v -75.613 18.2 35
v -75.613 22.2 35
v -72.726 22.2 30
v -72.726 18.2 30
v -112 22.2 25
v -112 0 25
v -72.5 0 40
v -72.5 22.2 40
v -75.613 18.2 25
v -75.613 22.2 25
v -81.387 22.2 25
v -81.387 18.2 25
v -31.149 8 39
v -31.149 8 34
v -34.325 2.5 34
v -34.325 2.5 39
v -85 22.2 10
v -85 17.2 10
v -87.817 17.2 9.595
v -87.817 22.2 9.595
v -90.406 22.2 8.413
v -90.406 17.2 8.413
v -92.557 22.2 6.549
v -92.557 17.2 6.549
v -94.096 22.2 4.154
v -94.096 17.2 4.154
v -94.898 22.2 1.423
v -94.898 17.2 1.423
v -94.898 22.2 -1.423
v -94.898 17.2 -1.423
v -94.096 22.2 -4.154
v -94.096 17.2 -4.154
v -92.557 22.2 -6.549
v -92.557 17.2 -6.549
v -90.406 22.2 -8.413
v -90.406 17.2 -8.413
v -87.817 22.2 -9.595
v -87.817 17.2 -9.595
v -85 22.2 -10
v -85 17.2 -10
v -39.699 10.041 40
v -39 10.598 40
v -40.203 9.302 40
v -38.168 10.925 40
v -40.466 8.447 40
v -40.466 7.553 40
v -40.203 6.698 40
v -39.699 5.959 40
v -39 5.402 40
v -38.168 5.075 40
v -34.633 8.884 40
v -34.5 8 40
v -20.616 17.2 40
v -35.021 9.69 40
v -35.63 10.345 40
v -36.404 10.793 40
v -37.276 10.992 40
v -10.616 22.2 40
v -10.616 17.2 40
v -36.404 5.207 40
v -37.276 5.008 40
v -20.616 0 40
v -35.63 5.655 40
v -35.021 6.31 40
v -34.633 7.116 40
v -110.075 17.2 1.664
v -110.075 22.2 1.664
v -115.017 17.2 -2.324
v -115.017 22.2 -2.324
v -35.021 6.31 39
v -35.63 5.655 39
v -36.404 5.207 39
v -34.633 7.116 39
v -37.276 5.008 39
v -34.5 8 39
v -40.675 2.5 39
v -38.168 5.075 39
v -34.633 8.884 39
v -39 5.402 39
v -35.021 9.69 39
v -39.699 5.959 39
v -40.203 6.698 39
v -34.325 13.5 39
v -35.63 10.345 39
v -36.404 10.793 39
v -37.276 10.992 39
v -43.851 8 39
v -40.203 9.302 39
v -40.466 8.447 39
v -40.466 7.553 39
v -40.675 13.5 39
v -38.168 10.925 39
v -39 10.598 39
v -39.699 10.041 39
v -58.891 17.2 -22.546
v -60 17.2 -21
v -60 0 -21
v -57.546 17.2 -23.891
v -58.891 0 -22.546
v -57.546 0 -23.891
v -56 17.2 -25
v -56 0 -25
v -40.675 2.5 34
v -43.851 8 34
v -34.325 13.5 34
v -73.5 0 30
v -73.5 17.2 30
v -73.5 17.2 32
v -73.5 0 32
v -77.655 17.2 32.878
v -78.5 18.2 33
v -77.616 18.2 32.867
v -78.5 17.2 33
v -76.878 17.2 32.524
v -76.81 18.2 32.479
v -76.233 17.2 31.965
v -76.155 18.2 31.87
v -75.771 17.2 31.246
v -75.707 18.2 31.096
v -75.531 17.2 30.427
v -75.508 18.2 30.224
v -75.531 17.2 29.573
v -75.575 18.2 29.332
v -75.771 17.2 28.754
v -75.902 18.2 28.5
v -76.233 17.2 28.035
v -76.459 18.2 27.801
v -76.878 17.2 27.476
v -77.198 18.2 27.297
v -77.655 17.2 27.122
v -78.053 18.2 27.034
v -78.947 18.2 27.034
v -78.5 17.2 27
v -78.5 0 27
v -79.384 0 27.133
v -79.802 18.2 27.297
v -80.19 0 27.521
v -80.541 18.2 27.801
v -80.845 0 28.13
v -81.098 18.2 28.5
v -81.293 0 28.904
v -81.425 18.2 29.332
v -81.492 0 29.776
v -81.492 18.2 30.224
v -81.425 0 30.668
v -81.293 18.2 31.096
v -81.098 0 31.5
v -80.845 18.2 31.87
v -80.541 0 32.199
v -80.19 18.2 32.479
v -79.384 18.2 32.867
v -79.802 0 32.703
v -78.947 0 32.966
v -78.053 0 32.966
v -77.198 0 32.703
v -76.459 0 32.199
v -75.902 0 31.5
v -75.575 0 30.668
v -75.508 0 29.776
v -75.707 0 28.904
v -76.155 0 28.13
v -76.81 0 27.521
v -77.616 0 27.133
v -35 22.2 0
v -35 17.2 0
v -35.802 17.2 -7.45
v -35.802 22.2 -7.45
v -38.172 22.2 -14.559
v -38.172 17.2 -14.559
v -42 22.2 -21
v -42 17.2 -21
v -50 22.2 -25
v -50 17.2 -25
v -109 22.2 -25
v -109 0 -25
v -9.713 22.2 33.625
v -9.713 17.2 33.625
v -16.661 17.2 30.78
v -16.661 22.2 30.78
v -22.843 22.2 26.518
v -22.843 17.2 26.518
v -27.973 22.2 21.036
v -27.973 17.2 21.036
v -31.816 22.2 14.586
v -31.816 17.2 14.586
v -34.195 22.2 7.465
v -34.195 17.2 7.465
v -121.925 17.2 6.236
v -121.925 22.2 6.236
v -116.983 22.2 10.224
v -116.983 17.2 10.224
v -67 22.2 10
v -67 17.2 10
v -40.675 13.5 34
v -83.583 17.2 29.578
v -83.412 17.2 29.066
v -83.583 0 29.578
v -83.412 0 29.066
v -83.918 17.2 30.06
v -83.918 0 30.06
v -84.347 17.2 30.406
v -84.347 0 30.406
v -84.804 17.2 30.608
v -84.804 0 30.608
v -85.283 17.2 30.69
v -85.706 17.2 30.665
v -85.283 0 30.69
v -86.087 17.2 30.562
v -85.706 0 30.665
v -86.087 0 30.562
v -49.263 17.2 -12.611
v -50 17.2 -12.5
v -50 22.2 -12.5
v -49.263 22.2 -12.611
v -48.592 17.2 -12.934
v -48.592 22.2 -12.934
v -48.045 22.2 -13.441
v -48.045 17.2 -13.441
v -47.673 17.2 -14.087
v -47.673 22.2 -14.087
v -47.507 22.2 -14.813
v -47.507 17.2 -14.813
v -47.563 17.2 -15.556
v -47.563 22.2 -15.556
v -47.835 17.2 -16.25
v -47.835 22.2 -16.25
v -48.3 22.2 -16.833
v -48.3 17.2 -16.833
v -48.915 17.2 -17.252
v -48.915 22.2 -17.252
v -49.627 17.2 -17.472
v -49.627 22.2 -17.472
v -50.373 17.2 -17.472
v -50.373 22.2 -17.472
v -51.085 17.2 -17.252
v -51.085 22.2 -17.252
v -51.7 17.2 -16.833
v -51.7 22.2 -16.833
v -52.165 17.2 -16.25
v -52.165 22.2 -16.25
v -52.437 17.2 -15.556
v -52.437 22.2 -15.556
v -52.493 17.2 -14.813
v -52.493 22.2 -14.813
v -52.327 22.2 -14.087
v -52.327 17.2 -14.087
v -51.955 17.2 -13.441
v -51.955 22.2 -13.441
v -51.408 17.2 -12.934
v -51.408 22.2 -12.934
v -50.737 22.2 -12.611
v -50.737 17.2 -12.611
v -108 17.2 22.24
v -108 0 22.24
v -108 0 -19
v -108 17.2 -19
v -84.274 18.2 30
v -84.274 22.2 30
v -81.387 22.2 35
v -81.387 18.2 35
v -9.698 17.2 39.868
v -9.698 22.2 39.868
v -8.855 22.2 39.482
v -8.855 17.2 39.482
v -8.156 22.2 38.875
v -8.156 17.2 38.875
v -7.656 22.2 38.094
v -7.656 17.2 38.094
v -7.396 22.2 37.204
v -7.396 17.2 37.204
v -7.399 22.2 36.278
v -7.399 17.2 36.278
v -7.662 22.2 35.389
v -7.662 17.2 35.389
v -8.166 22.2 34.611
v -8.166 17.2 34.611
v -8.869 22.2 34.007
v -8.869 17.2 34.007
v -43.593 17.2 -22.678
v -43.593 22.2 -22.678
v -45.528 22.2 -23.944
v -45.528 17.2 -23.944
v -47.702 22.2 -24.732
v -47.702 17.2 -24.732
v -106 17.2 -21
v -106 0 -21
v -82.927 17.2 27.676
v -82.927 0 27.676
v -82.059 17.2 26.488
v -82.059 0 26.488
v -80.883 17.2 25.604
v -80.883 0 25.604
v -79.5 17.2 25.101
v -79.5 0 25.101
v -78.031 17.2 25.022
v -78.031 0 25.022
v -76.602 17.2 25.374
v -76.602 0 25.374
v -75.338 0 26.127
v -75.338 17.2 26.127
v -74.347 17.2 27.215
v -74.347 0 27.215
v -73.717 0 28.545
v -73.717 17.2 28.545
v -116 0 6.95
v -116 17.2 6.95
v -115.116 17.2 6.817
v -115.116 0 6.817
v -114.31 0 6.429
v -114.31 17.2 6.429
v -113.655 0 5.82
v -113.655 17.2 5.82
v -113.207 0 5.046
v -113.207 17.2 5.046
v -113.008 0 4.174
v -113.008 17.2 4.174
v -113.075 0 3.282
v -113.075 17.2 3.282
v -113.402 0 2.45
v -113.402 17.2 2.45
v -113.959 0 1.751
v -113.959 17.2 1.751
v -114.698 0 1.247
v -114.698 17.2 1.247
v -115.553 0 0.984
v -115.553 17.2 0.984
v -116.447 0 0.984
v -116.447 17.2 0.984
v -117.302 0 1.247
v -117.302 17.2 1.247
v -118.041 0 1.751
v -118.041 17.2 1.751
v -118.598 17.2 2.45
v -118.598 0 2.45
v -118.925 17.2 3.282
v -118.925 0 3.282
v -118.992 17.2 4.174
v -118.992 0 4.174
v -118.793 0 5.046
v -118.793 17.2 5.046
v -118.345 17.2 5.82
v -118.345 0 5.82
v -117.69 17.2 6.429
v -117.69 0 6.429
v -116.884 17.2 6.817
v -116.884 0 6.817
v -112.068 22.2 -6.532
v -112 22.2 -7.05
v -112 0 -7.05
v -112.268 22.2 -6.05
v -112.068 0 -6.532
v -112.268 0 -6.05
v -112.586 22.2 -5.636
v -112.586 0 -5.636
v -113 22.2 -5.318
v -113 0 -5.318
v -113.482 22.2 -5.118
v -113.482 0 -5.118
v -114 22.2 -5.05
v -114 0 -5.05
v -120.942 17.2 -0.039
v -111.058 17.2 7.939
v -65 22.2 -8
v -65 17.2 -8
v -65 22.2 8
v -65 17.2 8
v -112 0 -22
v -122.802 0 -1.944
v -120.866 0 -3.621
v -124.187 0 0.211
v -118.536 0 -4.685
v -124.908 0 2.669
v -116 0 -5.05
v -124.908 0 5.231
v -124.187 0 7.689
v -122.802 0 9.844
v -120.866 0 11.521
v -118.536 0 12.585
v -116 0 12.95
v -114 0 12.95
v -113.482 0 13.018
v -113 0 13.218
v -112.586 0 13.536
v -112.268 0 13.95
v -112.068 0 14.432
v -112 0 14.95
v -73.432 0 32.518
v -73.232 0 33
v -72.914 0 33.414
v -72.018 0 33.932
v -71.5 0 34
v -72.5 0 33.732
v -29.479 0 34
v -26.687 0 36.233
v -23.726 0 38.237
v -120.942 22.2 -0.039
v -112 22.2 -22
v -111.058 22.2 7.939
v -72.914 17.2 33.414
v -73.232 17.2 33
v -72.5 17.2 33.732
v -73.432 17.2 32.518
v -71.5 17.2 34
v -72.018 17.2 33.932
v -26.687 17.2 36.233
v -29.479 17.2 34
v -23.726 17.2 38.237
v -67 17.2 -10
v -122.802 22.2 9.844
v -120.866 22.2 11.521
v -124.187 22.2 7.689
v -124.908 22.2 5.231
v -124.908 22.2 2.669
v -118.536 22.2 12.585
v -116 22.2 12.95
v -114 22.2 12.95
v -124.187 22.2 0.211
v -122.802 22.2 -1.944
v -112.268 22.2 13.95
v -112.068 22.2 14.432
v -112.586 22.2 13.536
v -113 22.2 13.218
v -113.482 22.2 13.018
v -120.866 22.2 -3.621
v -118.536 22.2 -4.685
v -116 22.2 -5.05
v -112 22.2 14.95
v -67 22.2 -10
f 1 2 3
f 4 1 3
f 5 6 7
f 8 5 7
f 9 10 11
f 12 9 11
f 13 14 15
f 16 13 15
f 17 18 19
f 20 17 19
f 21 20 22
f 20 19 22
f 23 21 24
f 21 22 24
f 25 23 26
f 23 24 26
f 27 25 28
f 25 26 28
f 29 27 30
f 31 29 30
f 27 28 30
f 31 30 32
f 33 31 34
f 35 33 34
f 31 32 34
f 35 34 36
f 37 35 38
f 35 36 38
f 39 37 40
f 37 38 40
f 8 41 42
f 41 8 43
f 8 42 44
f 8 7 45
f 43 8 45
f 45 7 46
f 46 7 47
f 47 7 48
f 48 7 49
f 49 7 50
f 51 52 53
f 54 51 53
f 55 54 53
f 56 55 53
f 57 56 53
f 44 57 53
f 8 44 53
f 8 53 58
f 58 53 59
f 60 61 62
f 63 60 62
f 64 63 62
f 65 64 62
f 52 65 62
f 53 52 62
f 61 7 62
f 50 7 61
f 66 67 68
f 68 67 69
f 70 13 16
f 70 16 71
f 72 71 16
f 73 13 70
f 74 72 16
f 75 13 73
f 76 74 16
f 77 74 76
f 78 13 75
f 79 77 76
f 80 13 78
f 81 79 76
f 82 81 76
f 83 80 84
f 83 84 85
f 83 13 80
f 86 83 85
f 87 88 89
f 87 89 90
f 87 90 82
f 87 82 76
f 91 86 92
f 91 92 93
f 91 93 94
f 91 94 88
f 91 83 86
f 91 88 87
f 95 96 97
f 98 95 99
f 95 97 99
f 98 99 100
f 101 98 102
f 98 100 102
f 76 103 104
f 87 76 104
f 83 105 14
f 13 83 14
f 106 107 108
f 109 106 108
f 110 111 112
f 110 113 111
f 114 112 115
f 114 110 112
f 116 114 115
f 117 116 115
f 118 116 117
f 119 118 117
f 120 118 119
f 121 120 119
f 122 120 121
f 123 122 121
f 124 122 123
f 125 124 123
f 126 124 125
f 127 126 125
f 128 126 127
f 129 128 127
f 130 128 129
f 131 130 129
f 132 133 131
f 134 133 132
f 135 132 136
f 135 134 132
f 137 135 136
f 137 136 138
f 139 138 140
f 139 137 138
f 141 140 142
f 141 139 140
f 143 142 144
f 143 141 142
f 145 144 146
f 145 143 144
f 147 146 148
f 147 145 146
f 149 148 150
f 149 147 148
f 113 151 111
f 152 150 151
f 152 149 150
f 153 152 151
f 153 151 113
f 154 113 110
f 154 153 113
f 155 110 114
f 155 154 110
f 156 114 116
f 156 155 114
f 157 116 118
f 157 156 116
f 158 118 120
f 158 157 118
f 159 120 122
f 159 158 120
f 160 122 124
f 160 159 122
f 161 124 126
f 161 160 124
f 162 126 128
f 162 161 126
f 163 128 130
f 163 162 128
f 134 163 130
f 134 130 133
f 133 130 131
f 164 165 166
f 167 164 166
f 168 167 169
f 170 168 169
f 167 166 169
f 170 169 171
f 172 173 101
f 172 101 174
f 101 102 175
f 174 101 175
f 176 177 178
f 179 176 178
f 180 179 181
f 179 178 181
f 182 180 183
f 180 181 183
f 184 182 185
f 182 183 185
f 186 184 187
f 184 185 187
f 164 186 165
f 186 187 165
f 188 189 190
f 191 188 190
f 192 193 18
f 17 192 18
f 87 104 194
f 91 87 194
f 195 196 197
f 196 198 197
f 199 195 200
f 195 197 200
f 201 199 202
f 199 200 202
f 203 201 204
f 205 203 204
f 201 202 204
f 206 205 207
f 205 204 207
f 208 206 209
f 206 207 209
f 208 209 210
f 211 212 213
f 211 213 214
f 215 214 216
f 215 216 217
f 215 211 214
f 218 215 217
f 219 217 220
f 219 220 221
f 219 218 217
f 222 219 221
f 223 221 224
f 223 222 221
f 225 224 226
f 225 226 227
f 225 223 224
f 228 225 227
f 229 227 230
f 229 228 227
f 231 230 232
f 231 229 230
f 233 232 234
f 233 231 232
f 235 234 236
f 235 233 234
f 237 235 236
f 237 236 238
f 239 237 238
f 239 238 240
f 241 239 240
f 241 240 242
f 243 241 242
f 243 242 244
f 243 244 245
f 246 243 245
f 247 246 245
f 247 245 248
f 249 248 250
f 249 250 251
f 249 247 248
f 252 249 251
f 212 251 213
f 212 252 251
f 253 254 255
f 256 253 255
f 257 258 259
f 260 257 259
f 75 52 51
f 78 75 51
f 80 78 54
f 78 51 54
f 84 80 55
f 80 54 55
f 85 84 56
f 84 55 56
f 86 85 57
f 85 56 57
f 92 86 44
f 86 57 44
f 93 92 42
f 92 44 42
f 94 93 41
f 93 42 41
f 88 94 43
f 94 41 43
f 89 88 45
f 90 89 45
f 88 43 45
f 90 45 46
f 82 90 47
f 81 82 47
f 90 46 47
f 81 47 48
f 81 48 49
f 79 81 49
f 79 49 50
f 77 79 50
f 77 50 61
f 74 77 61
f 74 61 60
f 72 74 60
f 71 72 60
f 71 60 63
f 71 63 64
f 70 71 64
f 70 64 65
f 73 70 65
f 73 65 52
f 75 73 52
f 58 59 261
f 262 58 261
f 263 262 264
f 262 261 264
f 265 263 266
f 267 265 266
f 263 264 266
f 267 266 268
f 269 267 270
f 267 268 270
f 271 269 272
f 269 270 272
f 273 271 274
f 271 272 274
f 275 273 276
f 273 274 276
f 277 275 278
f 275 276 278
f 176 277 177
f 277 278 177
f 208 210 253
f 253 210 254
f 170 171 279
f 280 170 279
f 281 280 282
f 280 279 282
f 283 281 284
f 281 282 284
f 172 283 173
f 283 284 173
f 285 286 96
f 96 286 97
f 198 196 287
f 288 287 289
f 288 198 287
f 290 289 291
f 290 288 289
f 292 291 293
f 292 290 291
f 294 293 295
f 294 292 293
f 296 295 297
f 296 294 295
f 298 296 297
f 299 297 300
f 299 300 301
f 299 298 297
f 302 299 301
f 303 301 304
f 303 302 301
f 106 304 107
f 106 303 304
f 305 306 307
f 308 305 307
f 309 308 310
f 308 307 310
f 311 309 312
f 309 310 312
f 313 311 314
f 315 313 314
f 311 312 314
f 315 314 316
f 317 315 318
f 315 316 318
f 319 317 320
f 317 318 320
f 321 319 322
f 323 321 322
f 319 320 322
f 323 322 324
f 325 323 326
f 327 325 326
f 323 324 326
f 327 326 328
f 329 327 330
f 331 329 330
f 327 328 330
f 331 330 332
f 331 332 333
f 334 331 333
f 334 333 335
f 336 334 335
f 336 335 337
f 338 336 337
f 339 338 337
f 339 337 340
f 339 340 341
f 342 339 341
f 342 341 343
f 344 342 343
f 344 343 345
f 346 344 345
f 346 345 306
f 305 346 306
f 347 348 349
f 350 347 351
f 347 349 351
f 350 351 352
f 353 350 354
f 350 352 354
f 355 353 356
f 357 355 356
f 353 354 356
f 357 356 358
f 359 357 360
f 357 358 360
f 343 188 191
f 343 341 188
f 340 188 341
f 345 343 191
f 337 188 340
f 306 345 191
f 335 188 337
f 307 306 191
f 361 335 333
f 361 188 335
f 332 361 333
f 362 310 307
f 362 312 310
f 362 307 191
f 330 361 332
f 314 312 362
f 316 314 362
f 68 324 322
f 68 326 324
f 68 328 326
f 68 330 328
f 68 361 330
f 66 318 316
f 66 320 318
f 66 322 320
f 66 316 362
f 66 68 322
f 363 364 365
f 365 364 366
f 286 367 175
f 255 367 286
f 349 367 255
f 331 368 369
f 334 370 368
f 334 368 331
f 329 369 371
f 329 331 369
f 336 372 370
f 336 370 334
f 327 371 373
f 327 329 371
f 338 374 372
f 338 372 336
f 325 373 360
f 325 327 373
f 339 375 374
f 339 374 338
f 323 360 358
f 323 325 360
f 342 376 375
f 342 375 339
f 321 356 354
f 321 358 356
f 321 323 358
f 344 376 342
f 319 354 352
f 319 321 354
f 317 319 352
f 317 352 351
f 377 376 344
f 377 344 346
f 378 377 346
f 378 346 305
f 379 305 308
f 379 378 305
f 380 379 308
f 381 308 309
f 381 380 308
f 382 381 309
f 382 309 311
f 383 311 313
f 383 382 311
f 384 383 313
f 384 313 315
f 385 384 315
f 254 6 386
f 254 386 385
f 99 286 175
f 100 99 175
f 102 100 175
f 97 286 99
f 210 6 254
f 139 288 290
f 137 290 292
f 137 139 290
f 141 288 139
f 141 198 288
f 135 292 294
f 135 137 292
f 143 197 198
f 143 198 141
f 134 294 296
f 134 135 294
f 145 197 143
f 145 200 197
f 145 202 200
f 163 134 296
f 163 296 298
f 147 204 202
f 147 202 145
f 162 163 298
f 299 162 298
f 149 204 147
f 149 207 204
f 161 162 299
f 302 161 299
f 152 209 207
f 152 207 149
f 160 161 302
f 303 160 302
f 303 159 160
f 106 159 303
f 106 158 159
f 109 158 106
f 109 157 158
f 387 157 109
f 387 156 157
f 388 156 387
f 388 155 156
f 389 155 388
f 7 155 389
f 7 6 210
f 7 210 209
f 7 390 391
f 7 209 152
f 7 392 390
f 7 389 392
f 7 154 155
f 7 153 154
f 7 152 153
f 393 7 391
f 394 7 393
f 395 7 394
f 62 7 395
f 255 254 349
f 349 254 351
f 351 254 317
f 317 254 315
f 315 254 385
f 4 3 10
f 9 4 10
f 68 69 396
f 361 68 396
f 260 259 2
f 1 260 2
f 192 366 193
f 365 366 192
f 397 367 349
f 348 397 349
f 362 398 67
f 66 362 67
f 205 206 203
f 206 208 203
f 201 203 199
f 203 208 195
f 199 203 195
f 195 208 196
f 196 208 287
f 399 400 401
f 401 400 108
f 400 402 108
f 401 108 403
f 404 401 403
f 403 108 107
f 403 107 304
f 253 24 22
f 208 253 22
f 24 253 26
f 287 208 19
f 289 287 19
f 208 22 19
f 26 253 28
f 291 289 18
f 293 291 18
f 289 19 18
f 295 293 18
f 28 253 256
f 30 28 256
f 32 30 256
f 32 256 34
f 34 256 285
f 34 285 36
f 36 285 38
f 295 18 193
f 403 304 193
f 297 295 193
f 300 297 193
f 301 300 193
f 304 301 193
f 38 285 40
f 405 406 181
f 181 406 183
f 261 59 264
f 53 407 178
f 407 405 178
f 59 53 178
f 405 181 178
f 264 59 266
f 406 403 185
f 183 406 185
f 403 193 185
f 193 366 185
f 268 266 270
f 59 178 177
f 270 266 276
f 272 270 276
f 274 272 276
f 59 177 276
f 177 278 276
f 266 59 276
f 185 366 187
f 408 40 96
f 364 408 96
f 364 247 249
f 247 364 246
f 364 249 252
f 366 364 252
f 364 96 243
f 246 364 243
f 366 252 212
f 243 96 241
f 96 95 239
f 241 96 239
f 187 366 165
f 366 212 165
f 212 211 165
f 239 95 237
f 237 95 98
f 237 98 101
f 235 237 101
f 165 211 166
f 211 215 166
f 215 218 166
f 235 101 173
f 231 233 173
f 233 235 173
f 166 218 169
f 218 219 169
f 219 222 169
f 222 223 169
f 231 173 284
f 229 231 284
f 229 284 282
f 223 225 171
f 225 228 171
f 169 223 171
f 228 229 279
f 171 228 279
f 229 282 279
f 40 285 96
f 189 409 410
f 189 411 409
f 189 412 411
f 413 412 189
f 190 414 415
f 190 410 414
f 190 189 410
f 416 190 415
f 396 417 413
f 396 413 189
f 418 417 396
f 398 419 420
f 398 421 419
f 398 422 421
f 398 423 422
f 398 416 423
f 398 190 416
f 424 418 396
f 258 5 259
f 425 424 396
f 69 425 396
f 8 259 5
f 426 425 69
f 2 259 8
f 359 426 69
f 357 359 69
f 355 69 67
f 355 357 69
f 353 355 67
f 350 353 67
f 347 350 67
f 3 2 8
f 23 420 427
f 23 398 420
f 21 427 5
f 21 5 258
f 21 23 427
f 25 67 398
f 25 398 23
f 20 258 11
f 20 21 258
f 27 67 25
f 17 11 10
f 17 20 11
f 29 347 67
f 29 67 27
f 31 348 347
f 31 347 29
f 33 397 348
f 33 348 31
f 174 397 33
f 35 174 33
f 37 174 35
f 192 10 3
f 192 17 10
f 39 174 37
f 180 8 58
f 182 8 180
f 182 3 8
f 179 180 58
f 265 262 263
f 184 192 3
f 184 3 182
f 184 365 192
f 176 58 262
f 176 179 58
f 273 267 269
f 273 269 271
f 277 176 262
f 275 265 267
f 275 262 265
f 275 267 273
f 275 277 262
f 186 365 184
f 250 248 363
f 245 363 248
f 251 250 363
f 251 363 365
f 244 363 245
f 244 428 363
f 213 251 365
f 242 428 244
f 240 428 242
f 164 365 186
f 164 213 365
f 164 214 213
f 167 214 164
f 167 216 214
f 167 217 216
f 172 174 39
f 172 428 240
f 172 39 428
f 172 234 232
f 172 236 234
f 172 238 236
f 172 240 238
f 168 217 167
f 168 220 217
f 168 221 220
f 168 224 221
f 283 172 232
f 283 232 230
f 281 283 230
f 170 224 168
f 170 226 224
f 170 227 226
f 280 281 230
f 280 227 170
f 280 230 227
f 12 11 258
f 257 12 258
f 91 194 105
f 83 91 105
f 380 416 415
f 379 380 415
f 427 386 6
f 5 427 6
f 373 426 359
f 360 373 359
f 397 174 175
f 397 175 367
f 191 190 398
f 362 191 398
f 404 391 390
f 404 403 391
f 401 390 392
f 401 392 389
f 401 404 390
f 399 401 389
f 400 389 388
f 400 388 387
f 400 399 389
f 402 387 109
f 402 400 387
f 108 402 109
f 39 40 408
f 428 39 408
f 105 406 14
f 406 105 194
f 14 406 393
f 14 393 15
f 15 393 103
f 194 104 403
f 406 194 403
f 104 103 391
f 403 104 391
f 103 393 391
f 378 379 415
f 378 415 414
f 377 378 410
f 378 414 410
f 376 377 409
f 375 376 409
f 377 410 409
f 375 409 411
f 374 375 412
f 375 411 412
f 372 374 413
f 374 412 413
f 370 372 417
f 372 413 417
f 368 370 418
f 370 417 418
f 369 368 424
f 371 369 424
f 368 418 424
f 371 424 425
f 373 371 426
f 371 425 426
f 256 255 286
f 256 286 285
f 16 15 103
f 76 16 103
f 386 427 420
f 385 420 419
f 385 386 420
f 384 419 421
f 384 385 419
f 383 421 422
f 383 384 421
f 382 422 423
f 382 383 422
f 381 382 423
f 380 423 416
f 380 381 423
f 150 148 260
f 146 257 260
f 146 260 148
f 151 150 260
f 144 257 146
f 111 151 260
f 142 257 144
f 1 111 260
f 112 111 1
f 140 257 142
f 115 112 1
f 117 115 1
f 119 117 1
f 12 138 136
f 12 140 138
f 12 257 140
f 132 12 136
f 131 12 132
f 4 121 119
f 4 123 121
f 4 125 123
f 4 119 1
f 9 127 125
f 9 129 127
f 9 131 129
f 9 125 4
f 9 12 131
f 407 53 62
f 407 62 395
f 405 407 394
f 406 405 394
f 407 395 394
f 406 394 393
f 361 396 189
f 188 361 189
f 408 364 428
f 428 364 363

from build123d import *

# Parameters (mm, degrees)
BOSS_EXTRUDE1_DEPTH = 17.2
CHAMFER1_SIZE       = 3
CHAMFER2_SIZE       = 2
SKETCH3_R           = 2.5
SKETCH3_R_2         = 3
BOSS_EXTRUDE2_DEPTH = 5
BOSS_EXTRUDE3_START = 17.2
SKETCH5_R           = 3
BOSS_EXTRUDE3_DEPTH = 17.2
BOSS_EXTRUDE4_DEPTH = 22.2
FILLET1_R           = 2
SKETCH8_R           = 3
CUT_EXTRUDE3_DEPTH  = 31
CUT_EXTRUDE4_DEPTH  = 5
SKETCH10_R          = 3
CUT_EXTRUDE5_DEPTH  = 44
FILLET2_R           = 2
CHAMFER3_SIZE       = 2
CUT_EXTRUDE6_DEPTH  = 4
CUT_EXTRUDE7_DEPTH  = 5


with BuildPart() as part:
    # Sketch2 → Boss-Extrude1 (new body)
    with BuildSketch(Plane(origin=(0, 0, 0), x_dir=(1, 0, 0), z_dir=(0, 1, 0))):
        with BuildLine():
            Line((-112, 25), (-112, -25))
            Line((-112, -25), (-72.5, -40))
            Line((-72.5, -40), (-20.615528128, -40))
            ThreePointArc((-20.615528128, -40), (-25.226188309, -37.264452544), (-29.478805946, -34))
            Line((-29.478805946, -34), (-77.032741633, -34))
            Line((-77.032741633, -34), (-108, -22.240281633))
            Line((-108, -22.240281633), (-108, 21))
            Line((-108, 21), (-60, 21))
            ThreePointArc((-60, 21), (-58.246211251, 23.246211251), (-56, 25))
            Line((-56, 25), (-112, 25))
        make_face()
    extrude(amount=BOSS_EXTRUDE1_DEPTH)

    # Chamfer1
    chamfer1_edges = [part.edges().sort_by_distance(p)[0] for p in [
        (-112, 8.6, -25),
    ]]
    chamfer(chamfer1_edges, length=CHAMFER1_SIZE)

    # Chamfer2
    chamfer2_edges = [part.edges().sort_by_distance(p)[0] for p in [
        (-108, 8.6, -21),
    ]]
    chamfer(chamfer2_edges, length=CHAMFER2_SIZE)

    # Sketch3 → Boss-Extrude2 (add)
    with BuildSketch(Plane(origin=(0, 17.2, 0), x_dir=(1, 0, 0), z_dir=(0, 1, 0))):
        with BuildLine():
            Line((-72.5, -40), (-20.615528128, -40))
            Line((-20.615528128, -40), (-10.615528128, -40))
            ThreePointArc((-10.615528128, -40), (-7.396351284, -37.204380582), (-9.713234444, -33.625185154))
            ThreePointArc((-9.713234444, -33.625185154), (-27.972872623, -21.03612125), (-35, 0))
            ThreePointArc((-35, 0), (-36.796084568, 11.067971811), (-42, 21))
            ThreePointArc((-42, 21), (-45.527864045, 23.94427191), (-50, 25))
            Line((-50, 25), (-109, 25))
            Line((-109, 25), (-112, 22))
            Line((-112, 22), (-112, -25))
            Line((-112, -25), (-72.5, -40))
        make_face()
        with Locations(Location((-50, 15, 0), (0, 0, 270))):
            Circle(SKETCH3_R, mode=Mode.SUBTRACT)
        with Locations(Location((-78.5, -30, 0), (0, 0, 270))):
            Circle(SKETCH3_R_2, mode=Mode.SUBTRACT)
        with BuildLine():
            Line((-85, 10), (-65, 10))
            Line((-65, 10), (-65, -10))
            Line((-65, -10), (-85, -10))
            ThreePointArc((-85, -10), (-95, 0), (-85, 10))
        make_face(mode=Mode.SUBTRACT)
    extrude(amount=BOSS_EXTRUDE2_DEPTH)

    # Sketch5 → Boss-Extrude3 (add)
    with BuildSketch(Plane.XZ.offset(-17.2).offset(BOSS_EXTRUDE3_START)):
        with BuildLine():
            Line((-73.5, 30), (-73.5, 34))
            Line((-73.5, 34), (-83.5, 34))
            Line((-83.5, 34), (-83.5, 30))
            ThreePointArc((-83.5, 30), (-78.5, 25), (-73.5, 30))
        make_face()
        with Locations(Location((-78.5, 30, 0), (0, 0, 270))):
            Circle(SKETCH5_R, mode=Mode.SUBTRACT)
    extrude(amount=-BOSS_EXTRUDE3_DEPTH)

    # Sketch7 → Boss-Extrude4 (add)
    with BuildSketch(Plane(origin=(0, 22.2, 0), x_dir=(1, 0, 0), z_dir=(0, 1, 0))):
        with BuildLine():
            Line((-112, 5.05), (-112, -12.95))
            Line((-112, -12.95), (-116, -12.95))
            ThreePointArc((-116, -12.95), (-125, -3.95), (-116, 5.05))
            Line((-116, 5.05), (-112, 5.05))
        make_face()
    extrude(amount=-BOSS_EXTRUDE4_DEPTH)

    # Fillet1
    fillet1_edges = [part.edges().sort_by_distance(p)[0] for p in [
        (-112, 11.1, 12.95),
        (-112, 11.1, -5.05),
    ]]
    fillet(fillet1_edges, radius=FILLET1_R)

    # Sketch8 → Cut-Extrude3 (cut)
    with BuildSketch(Plane(origin=(0, 22.2, 0), x_dir=(1, 0, 0), z_dir=(0, 1, 0))):
        with Locations(Location((-116, -3.95, 0), (0, 0, 270))):
            Circle(SKETCH8_R)
    extrude(amount=-CUT_EXTRUDE3_DEPTH, mode=Mode.SUBTRACT)

    # Sketch9 → Cut-Extrude4 (cut)
    with BuildSketch(Plane(origin=(0, 22.2, 0), x_dir=(1, 0, 0), z_dir=(0, 1, 0))):
        Polygon((-110.074764358, -1.664192501), (-115.016949541, 2.324308339), (-120.942185183, 0.03850084), (-121.925235642, -6.235807499), (-116.983050459, -10.224308339), (-111.057814817, -7.93850084), align=None)
    extrude(amount=-CUT_EXTRUDE4_DEPTH, mode=Mode.SUBTRACT)

    # Sketch10 → Cut-Extrude5 (cut)
    with BuildSketch(Plane.XY.offset(40)):
        with Locations((-37.5, 8)):
            Circle(SKETCH10_R)
    extrude(amount=-CUT_EXTRUDE5_DEPTH, mode=Mode.SUBTRACT)

    # Fillet2
    fillet2_edges = [part.edges().sort_by_distance(p)[0] for p in [
        (-83.5, 8.6, 31.544079101),
        (-73.5, 8.6, 34),
    ]]
    fillet(fillet2_edges, radius=FILLET2_R)

    # Chamfer3
    chamfer3_edges = [part.edges().sort_by_distance(p)[0] for p in [
        (-65, 19.7, 10),
        (-65, 19.7, -10),
    ]]
    chamfer(chamfer3_edges, length=CHAMFER3_SIZE)

    # Sketch11 → Cut-Extrude6 (cut)
    with BuildSketch(Plane(origin=(0, 22.2, 0), x_dir=(1, 0, 0), z_dir=(0, 1, 0))):
        Polygon((-72.726497308, -30), (-75.613248654, -25), (-81.386751346, -25), (-84.273502692, -30), (-81.386751346, -35), (-75.613248654, -35), align=None)
    extrude(amount=-CUT_EXTRUDE6_DEPTH, mode=Mode.SUBTRACT)

    # Sketch12 → Cut-Extrude7 (cut)
    with BuildSketch(Plane(origin=(0, 0, 34), x_dir=(-1, 0, 0), z_dir=(0, 0, -1))):
        Polygon((43.850852961, 8), (40.675426481, 13.5), (34.324573519, 13.5), (31.149147039, 8), (34.324573519, 2.5), (40.675426481, 2.5), align=None)
    extrude(amount=-CUT_EXTRUDE7_DEPTH, mode=Mode.SUBTRACT)


solid = part.part
